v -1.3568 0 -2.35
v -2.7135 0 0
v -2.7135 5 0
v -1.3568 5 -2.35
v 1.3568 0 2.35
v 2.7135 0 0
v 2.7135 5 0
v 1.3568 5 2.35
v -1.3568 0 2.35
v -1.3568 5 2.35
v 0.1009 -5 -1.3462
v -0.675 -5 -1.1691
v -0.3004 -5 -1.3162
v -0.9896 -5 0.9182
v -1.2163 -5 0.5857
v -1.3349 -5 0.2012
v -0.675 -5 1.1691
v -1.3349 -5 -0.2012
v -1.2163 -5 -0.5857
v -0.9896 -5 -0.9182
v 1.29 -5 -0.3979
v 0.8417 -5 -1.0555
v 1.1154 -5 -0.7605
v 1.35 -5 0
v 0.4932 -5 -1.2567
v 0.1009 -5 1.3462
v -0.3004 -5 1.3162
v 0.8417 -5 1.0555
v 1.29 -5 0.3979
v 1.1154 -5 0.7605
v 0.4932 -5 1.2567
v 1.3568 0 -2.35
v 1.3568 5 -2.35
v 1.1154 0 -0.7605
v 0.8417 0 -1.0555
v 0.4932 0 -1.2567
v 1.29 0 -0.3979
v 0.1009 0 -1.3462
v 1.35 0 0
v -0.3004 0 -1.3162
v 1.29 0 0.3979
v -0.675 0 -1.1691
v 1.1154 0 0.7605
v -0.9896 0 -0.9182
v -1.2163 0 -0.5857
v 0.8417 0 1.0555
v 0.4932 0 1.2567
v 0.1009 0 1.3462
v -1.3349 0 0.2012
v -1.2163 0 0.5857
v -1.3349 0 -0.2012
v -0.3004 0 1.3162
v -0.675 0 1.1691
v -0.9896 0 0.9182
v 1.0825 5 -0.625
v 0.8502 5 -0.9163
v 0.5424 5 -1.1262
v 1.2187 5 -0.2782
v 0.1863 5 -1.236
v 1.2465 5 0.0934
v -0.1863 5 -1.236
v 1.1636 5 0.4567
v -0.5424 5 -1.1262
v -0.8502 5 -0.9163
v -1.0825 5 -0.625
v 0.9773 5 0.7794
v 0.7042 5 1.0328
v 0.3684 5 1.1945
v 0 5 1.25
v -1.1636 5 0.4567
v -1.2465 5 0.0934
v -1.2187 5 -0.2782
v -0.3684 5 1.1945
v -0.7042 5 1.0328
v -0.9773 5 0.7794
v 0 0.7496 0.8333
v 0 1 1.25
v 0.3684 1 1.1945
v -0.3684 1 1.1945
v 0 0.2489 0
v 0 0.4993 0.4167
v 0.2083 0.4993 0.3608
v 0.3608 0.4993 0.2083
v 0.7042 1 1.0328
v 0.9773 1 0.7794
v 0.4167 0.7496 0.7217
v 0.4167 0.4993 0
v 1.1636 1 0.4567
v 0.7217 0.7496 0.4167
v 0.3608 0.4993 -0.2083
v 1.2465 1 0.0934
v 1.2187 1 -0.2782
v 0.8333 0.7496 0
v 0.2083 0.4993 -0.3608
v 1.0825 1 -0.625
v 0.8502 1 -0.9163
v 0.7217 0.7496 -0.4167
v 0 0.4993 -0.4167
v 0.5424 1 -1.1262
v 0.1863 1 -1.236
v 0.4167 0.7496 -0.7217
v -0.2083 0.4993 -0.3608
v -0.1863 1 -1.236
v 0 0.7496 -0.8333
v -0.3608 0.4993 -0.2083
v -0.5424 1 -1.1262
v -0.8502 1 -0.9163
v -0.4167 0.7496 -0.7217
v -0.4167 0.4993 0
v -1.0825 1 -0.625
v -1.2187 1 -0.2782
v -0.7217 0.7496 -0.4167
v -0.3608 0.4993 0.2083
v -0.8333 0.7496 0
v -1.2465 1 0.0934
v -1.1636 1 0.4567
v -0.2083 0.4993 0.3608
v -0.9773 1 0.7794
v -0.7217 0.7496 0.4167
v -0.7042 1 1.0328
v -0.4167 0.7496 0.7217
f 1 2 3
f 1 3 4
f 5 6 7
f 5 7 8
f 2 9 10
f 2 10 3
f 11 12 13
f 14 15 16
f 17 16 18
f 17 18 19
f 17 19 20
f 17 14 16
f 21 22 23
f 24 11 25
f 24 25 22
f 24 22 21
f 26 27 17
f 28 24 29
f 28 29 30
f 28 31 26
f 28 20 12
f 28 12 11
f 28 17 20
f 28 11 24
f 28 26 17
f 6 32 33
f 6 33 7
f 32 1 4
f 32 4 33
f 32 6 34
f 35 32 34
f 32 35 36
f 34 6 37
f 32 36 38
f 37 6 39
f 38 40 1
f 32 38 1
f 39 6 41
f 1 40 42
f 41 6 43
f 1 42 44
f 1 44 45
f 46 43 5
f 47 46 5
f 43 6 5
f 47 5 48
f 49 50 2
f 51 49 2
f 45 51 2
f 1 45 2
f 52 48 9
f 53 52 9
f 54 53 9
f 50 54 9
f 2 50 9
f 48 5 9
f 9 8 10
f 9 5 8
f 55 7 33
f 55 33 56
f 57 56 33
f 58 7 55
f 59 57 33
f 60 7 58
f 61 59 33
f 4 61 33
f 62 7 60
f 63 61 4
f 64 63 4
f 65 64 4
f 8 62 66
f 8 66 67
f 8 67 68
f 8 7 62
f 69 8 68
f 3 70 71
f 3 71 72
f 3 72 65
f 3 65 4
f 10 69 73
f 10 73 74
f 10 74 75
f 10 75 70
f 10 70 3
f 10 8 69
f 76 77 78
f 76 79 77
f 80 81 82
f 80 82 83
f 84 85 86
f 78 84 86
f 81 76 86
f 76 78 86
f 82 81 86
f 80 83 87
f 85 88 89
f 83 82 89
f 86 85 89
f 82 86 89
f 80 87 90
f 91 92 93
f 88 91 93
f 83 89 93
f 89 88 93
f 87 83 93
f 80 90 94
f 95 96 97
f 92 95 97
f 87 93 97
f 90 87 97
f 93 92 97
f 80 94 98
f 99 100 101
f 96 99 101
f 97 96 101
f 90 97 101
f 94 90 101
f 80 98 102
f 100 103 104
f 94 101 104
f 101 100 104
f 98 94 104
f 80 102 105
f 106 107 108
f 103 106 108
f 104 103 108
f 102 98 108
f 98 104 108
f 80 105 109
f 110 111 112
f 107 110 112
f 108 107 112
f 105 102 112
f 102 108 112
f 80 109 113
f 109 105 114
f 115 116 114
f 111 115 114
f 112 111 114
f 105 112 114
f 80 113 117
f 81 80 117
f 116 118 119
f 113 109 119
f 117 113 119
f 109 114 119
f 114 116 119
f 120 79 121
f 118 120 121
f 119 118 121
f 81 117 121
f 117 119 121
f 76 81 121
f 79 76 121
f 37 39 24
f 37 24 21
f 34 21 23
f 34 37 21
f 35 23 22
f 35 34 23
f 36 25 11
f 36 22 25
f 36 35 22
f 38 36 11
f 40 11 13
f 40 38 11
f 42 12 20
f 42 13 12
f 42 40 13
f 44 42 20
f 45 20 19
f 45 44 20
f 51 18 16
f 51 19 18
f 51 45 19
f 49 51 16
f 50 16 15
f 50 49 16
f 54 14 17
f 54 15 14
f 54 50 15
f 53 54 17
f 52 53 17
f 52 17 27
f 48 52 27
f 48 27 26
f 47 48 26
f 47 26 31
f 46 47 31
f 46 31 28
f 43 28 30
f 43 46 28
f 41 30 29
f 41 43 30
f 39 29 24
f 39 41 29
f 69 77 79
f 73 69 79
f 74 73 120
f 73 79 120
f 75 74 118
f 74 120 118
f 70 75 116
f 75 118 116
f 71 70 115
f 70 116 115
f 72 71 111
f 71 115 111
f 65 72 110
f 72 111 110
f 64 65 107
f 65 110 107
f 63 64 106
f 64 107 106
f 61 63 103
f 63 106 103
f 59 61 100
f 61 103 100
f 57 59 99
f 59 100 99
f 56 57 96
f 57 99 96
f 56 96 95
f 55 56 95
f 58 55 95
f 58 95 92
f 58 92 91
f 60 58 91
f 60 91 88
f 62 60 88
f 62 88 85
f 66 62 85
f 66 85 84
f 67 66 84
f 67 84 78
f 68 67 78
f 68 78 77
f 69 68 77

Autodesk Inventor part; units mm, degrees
ref_plane "YZ Plane" through (0, 0, 0) normal (1, 0, 0) x (0, 1, 0)
ref_plane "XZ Plane" through (0, 0, 0) normal (0, 1, 0) x (-1, 0, 0)
ref_plane "XY Plane" through (0, 0, 0) normal (0, 0, 1) x (1, 0, 0)
sketch "Sketch1" plane through (0, 0, 0) normal (0, 1, 0) x (-1, 0, 0)
  line L0 (-1.3568, -2.35) -> (-2.7135, 0)
  line L1 (-2.7135, 0) -> (-1.3568, 2.35)
  line L2 (-1.3568, 2.35) -> (1.3568, 2.35)
  line L3 (1.3568, 2.35) -> (2.7135, 0)
  line L4 (2.7135, 0) -> (1.3568, -2.35)
  line L5 (1.3568, -2.35) -> (-1.3568, -2.35)
  point P0 (0, 0)
  point P1 (0, 0)
  dimension "d13" = 4.7
extrude "Extrusion1" add sketch "Sketch1" along normal blind 5
sketch "Sketch3" plane through (0, 0, 0) normal (0, -1, 0) x (1, 0, 0)
  circle A0 centre (0, 0) radius 1.35
  dimension "d12" = 2.7
extrude "Extrusion2" add sketch "Sketch3" along normal blind 5
sketch "Sketch6" plane through (0, 5, 0) normal (0, 1, 0) x (1, 0, 0)
  point P0 (0, 0)
  point P1 (0, 0)
hole "Hole1" at (0, 5, 0) direction (0, -1, 0) diameter 2.5 depth 4 tip angle 118
properties part number "distances"
